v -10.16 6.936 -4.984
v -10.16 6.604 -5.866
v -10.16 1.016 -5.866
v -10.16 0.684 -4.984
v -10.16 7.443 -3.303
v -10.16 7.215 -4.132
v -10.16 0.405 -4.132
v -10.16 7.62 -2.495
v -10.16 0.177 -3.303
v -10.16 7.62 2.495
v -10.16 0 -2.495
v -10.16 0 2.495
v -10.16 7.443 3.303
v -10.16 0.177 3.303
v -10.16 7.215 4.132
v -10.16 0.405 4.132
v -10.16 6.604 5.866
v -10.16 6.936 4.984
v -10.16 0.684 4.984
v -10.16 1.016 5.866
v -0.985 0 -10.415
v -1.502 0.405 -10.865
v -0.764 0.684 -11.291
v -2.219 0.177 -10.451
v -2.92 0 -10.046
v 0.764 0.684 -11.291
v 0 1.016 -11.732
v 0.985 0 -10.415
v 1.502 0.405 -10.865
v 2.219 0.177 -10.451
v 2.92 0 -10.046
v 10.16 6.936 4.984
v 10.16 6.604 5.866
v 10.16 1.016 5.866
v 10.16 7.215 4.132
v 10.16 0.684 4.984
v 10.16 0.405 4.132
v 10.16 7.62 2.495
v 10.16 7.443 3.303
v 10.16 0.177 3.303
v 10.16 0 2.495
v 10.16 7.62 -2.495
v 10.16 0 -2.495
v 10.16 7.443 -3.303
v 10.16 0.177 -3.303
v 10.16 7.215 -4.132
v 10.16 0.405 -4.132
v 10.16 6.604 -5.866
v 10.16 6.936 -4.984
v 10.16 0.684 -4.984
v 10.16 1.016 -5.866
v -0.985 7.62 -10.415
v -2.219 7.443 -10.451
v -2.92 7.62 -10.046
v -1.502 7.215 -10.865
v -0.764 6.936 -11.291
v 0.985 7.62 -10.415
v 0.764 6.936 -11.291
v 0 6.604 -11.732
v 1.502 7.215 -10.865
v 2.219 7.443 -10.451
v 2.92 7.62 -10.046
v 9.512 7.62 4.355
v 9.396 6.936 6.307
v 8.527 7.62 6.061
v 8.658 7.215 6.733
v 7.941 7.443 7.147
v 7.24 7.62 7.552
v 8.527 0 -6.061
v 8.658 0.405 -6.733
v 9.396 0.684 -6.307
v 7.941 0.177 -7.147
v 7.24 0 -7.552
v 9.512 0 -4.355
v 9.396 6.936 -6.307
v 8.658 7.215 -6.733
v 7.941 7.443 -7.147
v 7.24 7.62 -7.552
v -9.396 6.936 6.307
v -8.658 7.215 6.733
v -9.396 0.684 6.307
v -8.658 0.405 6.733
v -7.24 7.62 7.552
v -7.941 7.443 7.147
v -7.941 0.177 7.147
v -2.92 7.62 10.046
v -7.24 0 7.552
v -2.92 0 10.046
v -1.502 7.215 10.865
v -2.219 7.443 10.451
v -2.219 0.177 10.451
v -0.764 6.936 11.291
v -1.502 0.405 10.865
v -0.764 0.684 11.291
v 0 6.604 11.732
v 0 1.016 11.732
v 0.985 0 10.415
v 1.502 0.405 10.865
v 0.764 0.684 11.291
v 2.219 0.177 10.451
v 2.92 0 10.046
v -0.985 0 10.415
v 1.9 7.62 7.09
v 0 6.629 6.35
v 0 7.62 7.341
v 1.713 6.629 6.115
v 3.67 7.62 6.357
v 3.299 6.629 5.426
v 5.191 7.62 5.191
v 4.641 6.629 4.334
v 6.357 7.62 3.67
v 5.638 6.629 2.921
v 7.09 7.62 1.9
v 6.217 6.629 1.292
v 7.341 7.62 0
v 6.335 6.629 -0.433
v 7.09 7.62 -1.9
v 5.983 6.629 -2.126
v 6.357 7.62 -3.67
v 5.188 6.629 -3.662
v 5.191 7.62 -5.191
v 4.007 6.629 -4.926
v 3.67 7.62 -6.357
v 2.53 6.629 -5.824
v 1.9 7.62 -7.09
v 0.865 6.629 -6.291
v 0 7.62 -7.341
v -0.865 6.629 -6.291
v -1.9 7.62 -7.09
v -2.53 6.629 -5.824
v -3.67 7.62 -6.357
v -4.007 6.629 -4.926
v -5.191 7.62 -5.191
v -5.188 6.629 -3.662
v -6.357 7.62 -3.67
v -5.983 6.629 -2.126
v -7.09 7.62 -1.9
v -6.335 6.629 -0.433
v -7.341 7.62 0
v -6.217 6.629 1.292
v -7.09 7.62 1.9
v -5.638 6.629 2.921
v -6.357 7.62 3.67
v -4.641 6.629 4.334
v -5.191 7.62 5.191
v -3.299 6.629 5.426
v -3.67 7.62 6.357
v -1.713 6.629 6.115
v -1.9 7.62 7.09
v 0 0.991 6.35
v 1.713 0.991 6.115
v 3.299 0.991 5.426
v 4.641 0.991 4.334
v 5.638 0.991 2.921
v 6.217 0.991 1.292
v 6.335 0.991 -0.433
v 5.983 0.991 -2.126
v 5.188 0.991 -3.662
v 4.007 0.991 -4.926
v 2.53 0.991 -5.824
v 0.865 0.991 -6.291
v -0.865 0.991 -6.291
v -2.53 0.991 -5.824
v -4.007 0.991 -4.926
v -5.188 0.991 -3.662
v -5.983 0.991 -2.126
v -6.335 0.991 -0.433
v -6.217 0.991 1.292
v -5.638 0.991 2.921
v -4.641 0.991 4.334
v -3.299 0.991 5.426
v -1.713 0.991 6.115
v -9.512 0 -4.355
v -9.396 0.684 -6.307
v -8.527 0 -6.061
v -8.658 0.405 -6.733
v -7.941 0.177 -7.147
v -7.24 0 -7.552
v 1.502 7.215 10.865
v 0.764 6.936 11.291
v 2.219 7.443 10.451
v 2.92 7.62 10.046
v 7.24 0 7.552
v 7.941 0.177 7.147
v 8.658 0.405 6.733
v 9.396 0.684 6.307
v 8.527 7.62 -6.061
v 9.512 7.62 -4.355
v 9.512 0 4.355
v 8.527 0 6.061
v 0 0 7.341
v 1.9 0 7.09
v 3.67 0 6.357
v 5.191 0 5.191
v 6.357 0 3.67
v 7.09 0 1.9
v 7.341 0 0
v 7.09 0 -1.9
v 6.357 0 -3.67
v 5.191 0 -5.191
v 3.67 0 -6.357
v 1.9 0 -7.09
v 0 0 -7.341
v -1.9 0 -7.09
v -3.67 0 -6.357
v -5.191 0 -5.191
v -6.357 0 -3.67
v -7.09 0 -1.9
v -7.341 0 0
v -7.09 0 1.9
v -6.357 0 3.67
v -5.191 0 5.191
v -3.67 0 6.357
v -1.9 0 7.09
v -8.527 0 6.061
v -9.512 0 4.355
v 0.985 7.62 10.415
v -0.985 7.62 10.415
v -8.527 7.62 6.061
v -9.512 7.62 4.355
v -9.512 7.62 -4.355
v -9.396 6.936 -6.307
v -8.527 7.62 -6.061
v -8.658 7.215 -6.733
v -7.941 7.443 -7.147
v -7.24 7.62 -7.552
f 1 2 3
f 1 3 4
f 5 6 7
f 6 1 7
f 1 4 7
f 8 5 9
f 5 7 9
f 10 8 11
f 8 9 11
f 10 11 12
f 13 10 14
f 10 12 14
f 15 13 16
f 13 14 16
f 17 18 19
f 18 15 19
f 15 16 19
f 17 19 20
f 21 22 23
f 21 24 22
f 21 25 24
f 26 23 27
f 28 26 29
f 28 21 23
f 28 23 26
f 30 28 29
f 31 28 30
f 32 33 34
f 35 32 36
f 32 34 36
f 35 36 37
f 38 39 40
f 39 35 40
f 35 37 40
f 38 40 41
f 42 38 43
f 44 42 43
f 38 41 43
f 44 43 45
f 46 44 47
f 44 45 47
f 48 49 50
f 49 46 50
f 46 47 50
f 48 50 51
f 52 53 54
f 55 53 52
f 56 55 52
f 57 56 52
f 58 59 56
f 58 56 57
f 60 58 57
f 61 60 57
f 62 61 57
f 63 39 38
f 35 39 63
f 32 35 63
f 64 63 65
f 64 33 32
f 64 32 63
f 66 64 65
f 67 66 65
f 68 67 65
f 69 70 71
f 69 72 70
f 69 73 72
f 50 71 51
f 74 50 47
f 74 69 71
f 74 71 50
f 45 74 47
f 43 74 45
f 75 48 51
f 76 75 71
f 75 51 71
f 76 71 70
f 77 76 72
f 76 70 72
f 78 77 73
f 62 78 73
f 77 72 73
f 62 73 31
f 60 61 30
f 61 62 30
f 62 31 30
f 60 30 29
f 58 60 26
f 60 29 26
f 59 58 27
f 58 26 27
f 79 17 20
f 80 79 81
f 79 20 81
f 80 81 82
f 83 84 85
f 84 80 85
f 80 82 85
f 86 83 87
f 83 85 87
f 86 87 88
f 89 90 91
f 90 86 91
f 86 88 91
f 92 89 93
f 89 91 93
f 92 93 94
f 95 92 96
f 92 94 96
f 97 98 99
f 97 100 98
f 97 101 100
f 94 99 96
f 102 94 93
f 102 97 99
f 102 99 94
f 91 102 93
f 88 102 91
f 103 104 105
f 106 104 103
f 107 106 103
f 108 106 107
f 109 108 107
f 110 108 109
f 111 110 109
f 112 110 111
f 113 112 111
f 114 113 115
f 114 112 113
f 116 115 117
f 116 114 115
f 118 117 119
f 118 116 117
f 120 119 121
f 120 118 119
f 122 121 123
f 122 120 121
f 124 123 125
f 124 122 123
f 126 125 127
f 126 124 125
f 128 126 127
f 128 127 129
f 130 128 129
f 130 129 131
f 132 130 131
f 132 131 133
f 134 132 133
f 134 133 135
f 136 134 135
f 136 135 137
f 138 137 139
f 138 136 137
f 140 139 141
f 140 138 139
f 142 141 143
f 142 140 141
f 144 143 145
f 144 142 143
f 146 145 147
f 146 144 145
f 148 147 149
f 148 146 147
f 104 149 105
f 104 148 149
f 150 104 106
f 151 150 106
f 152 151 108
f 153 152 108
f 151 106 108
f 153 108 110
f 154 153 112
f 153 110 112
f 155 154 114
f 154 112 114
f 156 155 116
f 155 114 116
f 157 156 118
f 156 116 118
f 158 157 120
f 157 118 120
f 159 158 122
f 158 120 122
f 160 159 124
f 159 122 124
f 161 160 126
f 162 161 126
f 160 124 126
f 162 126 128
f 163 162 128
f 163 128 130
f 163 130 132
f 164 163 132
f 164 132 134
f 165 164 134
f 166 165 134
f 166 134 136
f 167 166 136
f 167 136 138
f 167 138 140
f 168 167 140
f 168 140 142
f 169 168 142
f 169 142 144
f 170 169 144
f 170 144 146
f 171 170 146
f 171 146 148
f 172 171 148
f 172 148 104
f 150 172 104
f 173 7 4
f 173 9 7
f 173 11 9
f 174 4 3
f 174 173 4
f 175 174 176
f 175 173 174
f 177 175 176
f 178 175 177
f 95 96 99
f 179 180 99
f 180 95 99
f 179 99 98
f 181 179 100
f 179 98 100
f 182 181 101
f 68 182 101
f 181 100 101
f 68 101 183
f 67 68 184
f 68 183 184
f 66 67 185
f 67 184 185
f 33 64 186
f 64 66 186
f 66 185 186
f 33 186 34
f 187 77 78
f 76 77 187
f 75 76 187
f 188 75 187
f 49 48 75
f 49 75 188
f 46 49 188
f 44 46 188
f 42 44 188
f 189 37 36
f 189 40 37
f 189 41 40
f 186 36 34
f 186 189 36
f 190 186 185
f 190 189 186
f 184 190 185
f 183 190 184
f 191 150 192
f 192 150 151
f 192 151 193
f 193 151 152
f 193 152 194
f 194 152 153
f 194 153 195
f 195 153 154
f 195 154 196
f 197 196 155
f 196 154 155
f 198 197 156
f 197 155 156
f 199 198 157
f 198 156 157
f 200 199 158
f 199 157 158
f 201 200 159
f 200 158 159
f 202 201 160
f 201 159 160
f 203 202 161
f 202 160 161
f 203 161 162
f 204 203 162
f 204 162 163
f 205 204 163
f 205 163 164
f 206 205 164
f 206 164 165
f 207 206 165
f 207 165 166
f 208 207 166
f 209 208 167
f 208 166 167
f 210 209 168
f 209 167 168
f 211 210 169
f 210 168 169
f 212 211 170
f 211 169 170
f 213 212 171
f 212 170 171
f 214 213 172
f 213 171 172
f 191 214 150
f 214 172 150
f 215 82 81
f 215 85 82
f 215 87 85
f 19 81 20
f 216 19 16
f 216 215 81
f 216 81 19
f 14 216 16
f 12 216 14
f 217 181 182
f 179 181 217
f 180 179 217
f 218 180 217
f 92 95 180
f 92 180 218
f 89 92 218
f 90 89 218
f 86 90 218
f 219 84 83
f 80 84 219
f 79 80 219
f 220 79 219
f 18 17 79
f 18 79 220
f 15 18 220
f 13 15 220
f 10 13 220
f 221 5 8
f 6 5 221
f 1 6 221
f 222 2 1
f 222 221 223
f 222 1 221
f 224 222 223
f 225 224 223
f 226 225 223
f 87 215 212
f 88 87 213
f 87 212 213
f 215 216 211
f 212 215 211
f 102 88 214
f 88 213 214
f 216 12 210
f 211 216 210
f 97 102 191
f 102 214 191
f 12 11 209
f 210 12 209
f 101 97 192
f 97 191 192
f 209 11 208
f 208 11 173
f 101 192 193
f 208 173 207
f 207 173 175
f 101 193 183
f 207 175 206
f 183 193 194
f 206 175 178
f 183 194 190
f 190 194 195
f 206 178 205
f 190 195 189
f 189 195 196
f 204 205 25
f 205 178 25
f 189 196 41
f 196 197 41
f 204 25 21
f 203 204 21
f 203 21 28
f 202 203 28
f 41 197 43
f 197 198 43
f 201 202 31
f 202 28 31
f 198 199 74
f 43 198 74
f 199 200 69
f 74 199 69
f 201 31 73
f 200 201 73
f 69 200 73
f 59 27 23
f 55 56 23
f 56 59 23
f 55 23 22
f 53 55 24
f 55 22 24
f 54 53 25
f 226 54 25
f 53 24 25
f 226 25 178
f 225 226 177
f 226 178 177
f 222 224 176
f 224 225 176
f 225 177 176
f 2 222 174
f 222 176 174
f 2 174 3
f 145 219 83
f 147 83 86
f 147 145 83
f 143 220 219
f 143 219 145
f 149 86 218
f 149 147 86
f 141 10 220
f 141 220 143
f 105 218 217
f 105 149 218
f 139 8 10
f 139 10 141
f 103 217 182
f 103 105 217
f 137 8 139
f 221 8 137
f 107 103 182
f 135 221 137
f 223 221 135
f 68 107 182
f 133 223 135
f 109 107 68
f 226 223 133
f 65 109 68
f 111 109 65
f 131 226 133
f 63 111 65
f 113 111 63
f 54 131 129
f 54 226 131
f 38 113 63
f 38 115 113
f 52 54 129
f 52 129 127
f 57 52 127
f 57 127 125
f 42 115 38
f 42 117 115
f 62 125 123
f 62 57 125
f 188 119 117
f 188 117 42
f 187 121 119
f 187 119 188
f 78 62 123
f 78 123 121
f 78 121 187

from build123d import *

# Parameters (mm, degrees)
BOSS_EXTRUDE1_DEPTH = 7.62
SKETCH2_R           = 6.35
CUT_EXTRUDE1_DEPTH  = 18.289422585
CHAMFER1_SIZE       = 0.9906


with BuildPart() as part:
    # Sketch1 → Boss-Extrude1 (new body)
    with BuildSketch(Plane(origin=(0, 0, 0), x_dir=(1, 0, 0), z_dir=(0, 1, 0))):
        Polygon((0, -11.73175747), (10.16, -5.865878735), (10.16, 5.865878735), (0, 11.73175747), (-10.16, 5.865878735), (-10.16, -5.865878735), align=None)
    extrude(amount=BOSS_EXTRUDE1_DEPTH)

    # Sketch2 → Cut-Extrude1 (cut, through all)
    with BuildSketch(Plane(origin=(0, 7.62, 0), x_dir=(1, 0, 0), z_dir=(0, 1, 0))):
        with Locations(Location((0, 0, 0), (0, 0, 270))):
            Circle(SKETCH2_R)
    extrude(amount=-CUT_EXTRUDE1_DEPTH, mode=Mode.SUBTRACT)

    # Chamfer1
    chamfer1_edges = [part.edges().sort_by_distance(p)[0] for p in [
        (0, 0, -6.35),
        (0, 7.62, -6.35),
    ]]
    chamfer(chamfer1_edges, length=CHAMFER1_SIZE)

    # Sketch3 → Cut-Revolve1 (revolve, cut)
    with BuildSketch(Plane(origin=(0, 0, 0), x_dir=(0, 0, -1), z_dir=(1, 0, 0))):
        Polygon((-11.73175747, 7.62), (-10.46175747, 7.62), (-11.73175747, 6.604), align=None)
        Polygon((-11.73175747, 0), (-11.73175747, 1.016), (-10.46175747, 0), align=None)
    revolve(axis=Axis((0, 10.605597555, 0), (0, -1, 0)), mode=Mode.SUBTRACT)


solid = part.part
